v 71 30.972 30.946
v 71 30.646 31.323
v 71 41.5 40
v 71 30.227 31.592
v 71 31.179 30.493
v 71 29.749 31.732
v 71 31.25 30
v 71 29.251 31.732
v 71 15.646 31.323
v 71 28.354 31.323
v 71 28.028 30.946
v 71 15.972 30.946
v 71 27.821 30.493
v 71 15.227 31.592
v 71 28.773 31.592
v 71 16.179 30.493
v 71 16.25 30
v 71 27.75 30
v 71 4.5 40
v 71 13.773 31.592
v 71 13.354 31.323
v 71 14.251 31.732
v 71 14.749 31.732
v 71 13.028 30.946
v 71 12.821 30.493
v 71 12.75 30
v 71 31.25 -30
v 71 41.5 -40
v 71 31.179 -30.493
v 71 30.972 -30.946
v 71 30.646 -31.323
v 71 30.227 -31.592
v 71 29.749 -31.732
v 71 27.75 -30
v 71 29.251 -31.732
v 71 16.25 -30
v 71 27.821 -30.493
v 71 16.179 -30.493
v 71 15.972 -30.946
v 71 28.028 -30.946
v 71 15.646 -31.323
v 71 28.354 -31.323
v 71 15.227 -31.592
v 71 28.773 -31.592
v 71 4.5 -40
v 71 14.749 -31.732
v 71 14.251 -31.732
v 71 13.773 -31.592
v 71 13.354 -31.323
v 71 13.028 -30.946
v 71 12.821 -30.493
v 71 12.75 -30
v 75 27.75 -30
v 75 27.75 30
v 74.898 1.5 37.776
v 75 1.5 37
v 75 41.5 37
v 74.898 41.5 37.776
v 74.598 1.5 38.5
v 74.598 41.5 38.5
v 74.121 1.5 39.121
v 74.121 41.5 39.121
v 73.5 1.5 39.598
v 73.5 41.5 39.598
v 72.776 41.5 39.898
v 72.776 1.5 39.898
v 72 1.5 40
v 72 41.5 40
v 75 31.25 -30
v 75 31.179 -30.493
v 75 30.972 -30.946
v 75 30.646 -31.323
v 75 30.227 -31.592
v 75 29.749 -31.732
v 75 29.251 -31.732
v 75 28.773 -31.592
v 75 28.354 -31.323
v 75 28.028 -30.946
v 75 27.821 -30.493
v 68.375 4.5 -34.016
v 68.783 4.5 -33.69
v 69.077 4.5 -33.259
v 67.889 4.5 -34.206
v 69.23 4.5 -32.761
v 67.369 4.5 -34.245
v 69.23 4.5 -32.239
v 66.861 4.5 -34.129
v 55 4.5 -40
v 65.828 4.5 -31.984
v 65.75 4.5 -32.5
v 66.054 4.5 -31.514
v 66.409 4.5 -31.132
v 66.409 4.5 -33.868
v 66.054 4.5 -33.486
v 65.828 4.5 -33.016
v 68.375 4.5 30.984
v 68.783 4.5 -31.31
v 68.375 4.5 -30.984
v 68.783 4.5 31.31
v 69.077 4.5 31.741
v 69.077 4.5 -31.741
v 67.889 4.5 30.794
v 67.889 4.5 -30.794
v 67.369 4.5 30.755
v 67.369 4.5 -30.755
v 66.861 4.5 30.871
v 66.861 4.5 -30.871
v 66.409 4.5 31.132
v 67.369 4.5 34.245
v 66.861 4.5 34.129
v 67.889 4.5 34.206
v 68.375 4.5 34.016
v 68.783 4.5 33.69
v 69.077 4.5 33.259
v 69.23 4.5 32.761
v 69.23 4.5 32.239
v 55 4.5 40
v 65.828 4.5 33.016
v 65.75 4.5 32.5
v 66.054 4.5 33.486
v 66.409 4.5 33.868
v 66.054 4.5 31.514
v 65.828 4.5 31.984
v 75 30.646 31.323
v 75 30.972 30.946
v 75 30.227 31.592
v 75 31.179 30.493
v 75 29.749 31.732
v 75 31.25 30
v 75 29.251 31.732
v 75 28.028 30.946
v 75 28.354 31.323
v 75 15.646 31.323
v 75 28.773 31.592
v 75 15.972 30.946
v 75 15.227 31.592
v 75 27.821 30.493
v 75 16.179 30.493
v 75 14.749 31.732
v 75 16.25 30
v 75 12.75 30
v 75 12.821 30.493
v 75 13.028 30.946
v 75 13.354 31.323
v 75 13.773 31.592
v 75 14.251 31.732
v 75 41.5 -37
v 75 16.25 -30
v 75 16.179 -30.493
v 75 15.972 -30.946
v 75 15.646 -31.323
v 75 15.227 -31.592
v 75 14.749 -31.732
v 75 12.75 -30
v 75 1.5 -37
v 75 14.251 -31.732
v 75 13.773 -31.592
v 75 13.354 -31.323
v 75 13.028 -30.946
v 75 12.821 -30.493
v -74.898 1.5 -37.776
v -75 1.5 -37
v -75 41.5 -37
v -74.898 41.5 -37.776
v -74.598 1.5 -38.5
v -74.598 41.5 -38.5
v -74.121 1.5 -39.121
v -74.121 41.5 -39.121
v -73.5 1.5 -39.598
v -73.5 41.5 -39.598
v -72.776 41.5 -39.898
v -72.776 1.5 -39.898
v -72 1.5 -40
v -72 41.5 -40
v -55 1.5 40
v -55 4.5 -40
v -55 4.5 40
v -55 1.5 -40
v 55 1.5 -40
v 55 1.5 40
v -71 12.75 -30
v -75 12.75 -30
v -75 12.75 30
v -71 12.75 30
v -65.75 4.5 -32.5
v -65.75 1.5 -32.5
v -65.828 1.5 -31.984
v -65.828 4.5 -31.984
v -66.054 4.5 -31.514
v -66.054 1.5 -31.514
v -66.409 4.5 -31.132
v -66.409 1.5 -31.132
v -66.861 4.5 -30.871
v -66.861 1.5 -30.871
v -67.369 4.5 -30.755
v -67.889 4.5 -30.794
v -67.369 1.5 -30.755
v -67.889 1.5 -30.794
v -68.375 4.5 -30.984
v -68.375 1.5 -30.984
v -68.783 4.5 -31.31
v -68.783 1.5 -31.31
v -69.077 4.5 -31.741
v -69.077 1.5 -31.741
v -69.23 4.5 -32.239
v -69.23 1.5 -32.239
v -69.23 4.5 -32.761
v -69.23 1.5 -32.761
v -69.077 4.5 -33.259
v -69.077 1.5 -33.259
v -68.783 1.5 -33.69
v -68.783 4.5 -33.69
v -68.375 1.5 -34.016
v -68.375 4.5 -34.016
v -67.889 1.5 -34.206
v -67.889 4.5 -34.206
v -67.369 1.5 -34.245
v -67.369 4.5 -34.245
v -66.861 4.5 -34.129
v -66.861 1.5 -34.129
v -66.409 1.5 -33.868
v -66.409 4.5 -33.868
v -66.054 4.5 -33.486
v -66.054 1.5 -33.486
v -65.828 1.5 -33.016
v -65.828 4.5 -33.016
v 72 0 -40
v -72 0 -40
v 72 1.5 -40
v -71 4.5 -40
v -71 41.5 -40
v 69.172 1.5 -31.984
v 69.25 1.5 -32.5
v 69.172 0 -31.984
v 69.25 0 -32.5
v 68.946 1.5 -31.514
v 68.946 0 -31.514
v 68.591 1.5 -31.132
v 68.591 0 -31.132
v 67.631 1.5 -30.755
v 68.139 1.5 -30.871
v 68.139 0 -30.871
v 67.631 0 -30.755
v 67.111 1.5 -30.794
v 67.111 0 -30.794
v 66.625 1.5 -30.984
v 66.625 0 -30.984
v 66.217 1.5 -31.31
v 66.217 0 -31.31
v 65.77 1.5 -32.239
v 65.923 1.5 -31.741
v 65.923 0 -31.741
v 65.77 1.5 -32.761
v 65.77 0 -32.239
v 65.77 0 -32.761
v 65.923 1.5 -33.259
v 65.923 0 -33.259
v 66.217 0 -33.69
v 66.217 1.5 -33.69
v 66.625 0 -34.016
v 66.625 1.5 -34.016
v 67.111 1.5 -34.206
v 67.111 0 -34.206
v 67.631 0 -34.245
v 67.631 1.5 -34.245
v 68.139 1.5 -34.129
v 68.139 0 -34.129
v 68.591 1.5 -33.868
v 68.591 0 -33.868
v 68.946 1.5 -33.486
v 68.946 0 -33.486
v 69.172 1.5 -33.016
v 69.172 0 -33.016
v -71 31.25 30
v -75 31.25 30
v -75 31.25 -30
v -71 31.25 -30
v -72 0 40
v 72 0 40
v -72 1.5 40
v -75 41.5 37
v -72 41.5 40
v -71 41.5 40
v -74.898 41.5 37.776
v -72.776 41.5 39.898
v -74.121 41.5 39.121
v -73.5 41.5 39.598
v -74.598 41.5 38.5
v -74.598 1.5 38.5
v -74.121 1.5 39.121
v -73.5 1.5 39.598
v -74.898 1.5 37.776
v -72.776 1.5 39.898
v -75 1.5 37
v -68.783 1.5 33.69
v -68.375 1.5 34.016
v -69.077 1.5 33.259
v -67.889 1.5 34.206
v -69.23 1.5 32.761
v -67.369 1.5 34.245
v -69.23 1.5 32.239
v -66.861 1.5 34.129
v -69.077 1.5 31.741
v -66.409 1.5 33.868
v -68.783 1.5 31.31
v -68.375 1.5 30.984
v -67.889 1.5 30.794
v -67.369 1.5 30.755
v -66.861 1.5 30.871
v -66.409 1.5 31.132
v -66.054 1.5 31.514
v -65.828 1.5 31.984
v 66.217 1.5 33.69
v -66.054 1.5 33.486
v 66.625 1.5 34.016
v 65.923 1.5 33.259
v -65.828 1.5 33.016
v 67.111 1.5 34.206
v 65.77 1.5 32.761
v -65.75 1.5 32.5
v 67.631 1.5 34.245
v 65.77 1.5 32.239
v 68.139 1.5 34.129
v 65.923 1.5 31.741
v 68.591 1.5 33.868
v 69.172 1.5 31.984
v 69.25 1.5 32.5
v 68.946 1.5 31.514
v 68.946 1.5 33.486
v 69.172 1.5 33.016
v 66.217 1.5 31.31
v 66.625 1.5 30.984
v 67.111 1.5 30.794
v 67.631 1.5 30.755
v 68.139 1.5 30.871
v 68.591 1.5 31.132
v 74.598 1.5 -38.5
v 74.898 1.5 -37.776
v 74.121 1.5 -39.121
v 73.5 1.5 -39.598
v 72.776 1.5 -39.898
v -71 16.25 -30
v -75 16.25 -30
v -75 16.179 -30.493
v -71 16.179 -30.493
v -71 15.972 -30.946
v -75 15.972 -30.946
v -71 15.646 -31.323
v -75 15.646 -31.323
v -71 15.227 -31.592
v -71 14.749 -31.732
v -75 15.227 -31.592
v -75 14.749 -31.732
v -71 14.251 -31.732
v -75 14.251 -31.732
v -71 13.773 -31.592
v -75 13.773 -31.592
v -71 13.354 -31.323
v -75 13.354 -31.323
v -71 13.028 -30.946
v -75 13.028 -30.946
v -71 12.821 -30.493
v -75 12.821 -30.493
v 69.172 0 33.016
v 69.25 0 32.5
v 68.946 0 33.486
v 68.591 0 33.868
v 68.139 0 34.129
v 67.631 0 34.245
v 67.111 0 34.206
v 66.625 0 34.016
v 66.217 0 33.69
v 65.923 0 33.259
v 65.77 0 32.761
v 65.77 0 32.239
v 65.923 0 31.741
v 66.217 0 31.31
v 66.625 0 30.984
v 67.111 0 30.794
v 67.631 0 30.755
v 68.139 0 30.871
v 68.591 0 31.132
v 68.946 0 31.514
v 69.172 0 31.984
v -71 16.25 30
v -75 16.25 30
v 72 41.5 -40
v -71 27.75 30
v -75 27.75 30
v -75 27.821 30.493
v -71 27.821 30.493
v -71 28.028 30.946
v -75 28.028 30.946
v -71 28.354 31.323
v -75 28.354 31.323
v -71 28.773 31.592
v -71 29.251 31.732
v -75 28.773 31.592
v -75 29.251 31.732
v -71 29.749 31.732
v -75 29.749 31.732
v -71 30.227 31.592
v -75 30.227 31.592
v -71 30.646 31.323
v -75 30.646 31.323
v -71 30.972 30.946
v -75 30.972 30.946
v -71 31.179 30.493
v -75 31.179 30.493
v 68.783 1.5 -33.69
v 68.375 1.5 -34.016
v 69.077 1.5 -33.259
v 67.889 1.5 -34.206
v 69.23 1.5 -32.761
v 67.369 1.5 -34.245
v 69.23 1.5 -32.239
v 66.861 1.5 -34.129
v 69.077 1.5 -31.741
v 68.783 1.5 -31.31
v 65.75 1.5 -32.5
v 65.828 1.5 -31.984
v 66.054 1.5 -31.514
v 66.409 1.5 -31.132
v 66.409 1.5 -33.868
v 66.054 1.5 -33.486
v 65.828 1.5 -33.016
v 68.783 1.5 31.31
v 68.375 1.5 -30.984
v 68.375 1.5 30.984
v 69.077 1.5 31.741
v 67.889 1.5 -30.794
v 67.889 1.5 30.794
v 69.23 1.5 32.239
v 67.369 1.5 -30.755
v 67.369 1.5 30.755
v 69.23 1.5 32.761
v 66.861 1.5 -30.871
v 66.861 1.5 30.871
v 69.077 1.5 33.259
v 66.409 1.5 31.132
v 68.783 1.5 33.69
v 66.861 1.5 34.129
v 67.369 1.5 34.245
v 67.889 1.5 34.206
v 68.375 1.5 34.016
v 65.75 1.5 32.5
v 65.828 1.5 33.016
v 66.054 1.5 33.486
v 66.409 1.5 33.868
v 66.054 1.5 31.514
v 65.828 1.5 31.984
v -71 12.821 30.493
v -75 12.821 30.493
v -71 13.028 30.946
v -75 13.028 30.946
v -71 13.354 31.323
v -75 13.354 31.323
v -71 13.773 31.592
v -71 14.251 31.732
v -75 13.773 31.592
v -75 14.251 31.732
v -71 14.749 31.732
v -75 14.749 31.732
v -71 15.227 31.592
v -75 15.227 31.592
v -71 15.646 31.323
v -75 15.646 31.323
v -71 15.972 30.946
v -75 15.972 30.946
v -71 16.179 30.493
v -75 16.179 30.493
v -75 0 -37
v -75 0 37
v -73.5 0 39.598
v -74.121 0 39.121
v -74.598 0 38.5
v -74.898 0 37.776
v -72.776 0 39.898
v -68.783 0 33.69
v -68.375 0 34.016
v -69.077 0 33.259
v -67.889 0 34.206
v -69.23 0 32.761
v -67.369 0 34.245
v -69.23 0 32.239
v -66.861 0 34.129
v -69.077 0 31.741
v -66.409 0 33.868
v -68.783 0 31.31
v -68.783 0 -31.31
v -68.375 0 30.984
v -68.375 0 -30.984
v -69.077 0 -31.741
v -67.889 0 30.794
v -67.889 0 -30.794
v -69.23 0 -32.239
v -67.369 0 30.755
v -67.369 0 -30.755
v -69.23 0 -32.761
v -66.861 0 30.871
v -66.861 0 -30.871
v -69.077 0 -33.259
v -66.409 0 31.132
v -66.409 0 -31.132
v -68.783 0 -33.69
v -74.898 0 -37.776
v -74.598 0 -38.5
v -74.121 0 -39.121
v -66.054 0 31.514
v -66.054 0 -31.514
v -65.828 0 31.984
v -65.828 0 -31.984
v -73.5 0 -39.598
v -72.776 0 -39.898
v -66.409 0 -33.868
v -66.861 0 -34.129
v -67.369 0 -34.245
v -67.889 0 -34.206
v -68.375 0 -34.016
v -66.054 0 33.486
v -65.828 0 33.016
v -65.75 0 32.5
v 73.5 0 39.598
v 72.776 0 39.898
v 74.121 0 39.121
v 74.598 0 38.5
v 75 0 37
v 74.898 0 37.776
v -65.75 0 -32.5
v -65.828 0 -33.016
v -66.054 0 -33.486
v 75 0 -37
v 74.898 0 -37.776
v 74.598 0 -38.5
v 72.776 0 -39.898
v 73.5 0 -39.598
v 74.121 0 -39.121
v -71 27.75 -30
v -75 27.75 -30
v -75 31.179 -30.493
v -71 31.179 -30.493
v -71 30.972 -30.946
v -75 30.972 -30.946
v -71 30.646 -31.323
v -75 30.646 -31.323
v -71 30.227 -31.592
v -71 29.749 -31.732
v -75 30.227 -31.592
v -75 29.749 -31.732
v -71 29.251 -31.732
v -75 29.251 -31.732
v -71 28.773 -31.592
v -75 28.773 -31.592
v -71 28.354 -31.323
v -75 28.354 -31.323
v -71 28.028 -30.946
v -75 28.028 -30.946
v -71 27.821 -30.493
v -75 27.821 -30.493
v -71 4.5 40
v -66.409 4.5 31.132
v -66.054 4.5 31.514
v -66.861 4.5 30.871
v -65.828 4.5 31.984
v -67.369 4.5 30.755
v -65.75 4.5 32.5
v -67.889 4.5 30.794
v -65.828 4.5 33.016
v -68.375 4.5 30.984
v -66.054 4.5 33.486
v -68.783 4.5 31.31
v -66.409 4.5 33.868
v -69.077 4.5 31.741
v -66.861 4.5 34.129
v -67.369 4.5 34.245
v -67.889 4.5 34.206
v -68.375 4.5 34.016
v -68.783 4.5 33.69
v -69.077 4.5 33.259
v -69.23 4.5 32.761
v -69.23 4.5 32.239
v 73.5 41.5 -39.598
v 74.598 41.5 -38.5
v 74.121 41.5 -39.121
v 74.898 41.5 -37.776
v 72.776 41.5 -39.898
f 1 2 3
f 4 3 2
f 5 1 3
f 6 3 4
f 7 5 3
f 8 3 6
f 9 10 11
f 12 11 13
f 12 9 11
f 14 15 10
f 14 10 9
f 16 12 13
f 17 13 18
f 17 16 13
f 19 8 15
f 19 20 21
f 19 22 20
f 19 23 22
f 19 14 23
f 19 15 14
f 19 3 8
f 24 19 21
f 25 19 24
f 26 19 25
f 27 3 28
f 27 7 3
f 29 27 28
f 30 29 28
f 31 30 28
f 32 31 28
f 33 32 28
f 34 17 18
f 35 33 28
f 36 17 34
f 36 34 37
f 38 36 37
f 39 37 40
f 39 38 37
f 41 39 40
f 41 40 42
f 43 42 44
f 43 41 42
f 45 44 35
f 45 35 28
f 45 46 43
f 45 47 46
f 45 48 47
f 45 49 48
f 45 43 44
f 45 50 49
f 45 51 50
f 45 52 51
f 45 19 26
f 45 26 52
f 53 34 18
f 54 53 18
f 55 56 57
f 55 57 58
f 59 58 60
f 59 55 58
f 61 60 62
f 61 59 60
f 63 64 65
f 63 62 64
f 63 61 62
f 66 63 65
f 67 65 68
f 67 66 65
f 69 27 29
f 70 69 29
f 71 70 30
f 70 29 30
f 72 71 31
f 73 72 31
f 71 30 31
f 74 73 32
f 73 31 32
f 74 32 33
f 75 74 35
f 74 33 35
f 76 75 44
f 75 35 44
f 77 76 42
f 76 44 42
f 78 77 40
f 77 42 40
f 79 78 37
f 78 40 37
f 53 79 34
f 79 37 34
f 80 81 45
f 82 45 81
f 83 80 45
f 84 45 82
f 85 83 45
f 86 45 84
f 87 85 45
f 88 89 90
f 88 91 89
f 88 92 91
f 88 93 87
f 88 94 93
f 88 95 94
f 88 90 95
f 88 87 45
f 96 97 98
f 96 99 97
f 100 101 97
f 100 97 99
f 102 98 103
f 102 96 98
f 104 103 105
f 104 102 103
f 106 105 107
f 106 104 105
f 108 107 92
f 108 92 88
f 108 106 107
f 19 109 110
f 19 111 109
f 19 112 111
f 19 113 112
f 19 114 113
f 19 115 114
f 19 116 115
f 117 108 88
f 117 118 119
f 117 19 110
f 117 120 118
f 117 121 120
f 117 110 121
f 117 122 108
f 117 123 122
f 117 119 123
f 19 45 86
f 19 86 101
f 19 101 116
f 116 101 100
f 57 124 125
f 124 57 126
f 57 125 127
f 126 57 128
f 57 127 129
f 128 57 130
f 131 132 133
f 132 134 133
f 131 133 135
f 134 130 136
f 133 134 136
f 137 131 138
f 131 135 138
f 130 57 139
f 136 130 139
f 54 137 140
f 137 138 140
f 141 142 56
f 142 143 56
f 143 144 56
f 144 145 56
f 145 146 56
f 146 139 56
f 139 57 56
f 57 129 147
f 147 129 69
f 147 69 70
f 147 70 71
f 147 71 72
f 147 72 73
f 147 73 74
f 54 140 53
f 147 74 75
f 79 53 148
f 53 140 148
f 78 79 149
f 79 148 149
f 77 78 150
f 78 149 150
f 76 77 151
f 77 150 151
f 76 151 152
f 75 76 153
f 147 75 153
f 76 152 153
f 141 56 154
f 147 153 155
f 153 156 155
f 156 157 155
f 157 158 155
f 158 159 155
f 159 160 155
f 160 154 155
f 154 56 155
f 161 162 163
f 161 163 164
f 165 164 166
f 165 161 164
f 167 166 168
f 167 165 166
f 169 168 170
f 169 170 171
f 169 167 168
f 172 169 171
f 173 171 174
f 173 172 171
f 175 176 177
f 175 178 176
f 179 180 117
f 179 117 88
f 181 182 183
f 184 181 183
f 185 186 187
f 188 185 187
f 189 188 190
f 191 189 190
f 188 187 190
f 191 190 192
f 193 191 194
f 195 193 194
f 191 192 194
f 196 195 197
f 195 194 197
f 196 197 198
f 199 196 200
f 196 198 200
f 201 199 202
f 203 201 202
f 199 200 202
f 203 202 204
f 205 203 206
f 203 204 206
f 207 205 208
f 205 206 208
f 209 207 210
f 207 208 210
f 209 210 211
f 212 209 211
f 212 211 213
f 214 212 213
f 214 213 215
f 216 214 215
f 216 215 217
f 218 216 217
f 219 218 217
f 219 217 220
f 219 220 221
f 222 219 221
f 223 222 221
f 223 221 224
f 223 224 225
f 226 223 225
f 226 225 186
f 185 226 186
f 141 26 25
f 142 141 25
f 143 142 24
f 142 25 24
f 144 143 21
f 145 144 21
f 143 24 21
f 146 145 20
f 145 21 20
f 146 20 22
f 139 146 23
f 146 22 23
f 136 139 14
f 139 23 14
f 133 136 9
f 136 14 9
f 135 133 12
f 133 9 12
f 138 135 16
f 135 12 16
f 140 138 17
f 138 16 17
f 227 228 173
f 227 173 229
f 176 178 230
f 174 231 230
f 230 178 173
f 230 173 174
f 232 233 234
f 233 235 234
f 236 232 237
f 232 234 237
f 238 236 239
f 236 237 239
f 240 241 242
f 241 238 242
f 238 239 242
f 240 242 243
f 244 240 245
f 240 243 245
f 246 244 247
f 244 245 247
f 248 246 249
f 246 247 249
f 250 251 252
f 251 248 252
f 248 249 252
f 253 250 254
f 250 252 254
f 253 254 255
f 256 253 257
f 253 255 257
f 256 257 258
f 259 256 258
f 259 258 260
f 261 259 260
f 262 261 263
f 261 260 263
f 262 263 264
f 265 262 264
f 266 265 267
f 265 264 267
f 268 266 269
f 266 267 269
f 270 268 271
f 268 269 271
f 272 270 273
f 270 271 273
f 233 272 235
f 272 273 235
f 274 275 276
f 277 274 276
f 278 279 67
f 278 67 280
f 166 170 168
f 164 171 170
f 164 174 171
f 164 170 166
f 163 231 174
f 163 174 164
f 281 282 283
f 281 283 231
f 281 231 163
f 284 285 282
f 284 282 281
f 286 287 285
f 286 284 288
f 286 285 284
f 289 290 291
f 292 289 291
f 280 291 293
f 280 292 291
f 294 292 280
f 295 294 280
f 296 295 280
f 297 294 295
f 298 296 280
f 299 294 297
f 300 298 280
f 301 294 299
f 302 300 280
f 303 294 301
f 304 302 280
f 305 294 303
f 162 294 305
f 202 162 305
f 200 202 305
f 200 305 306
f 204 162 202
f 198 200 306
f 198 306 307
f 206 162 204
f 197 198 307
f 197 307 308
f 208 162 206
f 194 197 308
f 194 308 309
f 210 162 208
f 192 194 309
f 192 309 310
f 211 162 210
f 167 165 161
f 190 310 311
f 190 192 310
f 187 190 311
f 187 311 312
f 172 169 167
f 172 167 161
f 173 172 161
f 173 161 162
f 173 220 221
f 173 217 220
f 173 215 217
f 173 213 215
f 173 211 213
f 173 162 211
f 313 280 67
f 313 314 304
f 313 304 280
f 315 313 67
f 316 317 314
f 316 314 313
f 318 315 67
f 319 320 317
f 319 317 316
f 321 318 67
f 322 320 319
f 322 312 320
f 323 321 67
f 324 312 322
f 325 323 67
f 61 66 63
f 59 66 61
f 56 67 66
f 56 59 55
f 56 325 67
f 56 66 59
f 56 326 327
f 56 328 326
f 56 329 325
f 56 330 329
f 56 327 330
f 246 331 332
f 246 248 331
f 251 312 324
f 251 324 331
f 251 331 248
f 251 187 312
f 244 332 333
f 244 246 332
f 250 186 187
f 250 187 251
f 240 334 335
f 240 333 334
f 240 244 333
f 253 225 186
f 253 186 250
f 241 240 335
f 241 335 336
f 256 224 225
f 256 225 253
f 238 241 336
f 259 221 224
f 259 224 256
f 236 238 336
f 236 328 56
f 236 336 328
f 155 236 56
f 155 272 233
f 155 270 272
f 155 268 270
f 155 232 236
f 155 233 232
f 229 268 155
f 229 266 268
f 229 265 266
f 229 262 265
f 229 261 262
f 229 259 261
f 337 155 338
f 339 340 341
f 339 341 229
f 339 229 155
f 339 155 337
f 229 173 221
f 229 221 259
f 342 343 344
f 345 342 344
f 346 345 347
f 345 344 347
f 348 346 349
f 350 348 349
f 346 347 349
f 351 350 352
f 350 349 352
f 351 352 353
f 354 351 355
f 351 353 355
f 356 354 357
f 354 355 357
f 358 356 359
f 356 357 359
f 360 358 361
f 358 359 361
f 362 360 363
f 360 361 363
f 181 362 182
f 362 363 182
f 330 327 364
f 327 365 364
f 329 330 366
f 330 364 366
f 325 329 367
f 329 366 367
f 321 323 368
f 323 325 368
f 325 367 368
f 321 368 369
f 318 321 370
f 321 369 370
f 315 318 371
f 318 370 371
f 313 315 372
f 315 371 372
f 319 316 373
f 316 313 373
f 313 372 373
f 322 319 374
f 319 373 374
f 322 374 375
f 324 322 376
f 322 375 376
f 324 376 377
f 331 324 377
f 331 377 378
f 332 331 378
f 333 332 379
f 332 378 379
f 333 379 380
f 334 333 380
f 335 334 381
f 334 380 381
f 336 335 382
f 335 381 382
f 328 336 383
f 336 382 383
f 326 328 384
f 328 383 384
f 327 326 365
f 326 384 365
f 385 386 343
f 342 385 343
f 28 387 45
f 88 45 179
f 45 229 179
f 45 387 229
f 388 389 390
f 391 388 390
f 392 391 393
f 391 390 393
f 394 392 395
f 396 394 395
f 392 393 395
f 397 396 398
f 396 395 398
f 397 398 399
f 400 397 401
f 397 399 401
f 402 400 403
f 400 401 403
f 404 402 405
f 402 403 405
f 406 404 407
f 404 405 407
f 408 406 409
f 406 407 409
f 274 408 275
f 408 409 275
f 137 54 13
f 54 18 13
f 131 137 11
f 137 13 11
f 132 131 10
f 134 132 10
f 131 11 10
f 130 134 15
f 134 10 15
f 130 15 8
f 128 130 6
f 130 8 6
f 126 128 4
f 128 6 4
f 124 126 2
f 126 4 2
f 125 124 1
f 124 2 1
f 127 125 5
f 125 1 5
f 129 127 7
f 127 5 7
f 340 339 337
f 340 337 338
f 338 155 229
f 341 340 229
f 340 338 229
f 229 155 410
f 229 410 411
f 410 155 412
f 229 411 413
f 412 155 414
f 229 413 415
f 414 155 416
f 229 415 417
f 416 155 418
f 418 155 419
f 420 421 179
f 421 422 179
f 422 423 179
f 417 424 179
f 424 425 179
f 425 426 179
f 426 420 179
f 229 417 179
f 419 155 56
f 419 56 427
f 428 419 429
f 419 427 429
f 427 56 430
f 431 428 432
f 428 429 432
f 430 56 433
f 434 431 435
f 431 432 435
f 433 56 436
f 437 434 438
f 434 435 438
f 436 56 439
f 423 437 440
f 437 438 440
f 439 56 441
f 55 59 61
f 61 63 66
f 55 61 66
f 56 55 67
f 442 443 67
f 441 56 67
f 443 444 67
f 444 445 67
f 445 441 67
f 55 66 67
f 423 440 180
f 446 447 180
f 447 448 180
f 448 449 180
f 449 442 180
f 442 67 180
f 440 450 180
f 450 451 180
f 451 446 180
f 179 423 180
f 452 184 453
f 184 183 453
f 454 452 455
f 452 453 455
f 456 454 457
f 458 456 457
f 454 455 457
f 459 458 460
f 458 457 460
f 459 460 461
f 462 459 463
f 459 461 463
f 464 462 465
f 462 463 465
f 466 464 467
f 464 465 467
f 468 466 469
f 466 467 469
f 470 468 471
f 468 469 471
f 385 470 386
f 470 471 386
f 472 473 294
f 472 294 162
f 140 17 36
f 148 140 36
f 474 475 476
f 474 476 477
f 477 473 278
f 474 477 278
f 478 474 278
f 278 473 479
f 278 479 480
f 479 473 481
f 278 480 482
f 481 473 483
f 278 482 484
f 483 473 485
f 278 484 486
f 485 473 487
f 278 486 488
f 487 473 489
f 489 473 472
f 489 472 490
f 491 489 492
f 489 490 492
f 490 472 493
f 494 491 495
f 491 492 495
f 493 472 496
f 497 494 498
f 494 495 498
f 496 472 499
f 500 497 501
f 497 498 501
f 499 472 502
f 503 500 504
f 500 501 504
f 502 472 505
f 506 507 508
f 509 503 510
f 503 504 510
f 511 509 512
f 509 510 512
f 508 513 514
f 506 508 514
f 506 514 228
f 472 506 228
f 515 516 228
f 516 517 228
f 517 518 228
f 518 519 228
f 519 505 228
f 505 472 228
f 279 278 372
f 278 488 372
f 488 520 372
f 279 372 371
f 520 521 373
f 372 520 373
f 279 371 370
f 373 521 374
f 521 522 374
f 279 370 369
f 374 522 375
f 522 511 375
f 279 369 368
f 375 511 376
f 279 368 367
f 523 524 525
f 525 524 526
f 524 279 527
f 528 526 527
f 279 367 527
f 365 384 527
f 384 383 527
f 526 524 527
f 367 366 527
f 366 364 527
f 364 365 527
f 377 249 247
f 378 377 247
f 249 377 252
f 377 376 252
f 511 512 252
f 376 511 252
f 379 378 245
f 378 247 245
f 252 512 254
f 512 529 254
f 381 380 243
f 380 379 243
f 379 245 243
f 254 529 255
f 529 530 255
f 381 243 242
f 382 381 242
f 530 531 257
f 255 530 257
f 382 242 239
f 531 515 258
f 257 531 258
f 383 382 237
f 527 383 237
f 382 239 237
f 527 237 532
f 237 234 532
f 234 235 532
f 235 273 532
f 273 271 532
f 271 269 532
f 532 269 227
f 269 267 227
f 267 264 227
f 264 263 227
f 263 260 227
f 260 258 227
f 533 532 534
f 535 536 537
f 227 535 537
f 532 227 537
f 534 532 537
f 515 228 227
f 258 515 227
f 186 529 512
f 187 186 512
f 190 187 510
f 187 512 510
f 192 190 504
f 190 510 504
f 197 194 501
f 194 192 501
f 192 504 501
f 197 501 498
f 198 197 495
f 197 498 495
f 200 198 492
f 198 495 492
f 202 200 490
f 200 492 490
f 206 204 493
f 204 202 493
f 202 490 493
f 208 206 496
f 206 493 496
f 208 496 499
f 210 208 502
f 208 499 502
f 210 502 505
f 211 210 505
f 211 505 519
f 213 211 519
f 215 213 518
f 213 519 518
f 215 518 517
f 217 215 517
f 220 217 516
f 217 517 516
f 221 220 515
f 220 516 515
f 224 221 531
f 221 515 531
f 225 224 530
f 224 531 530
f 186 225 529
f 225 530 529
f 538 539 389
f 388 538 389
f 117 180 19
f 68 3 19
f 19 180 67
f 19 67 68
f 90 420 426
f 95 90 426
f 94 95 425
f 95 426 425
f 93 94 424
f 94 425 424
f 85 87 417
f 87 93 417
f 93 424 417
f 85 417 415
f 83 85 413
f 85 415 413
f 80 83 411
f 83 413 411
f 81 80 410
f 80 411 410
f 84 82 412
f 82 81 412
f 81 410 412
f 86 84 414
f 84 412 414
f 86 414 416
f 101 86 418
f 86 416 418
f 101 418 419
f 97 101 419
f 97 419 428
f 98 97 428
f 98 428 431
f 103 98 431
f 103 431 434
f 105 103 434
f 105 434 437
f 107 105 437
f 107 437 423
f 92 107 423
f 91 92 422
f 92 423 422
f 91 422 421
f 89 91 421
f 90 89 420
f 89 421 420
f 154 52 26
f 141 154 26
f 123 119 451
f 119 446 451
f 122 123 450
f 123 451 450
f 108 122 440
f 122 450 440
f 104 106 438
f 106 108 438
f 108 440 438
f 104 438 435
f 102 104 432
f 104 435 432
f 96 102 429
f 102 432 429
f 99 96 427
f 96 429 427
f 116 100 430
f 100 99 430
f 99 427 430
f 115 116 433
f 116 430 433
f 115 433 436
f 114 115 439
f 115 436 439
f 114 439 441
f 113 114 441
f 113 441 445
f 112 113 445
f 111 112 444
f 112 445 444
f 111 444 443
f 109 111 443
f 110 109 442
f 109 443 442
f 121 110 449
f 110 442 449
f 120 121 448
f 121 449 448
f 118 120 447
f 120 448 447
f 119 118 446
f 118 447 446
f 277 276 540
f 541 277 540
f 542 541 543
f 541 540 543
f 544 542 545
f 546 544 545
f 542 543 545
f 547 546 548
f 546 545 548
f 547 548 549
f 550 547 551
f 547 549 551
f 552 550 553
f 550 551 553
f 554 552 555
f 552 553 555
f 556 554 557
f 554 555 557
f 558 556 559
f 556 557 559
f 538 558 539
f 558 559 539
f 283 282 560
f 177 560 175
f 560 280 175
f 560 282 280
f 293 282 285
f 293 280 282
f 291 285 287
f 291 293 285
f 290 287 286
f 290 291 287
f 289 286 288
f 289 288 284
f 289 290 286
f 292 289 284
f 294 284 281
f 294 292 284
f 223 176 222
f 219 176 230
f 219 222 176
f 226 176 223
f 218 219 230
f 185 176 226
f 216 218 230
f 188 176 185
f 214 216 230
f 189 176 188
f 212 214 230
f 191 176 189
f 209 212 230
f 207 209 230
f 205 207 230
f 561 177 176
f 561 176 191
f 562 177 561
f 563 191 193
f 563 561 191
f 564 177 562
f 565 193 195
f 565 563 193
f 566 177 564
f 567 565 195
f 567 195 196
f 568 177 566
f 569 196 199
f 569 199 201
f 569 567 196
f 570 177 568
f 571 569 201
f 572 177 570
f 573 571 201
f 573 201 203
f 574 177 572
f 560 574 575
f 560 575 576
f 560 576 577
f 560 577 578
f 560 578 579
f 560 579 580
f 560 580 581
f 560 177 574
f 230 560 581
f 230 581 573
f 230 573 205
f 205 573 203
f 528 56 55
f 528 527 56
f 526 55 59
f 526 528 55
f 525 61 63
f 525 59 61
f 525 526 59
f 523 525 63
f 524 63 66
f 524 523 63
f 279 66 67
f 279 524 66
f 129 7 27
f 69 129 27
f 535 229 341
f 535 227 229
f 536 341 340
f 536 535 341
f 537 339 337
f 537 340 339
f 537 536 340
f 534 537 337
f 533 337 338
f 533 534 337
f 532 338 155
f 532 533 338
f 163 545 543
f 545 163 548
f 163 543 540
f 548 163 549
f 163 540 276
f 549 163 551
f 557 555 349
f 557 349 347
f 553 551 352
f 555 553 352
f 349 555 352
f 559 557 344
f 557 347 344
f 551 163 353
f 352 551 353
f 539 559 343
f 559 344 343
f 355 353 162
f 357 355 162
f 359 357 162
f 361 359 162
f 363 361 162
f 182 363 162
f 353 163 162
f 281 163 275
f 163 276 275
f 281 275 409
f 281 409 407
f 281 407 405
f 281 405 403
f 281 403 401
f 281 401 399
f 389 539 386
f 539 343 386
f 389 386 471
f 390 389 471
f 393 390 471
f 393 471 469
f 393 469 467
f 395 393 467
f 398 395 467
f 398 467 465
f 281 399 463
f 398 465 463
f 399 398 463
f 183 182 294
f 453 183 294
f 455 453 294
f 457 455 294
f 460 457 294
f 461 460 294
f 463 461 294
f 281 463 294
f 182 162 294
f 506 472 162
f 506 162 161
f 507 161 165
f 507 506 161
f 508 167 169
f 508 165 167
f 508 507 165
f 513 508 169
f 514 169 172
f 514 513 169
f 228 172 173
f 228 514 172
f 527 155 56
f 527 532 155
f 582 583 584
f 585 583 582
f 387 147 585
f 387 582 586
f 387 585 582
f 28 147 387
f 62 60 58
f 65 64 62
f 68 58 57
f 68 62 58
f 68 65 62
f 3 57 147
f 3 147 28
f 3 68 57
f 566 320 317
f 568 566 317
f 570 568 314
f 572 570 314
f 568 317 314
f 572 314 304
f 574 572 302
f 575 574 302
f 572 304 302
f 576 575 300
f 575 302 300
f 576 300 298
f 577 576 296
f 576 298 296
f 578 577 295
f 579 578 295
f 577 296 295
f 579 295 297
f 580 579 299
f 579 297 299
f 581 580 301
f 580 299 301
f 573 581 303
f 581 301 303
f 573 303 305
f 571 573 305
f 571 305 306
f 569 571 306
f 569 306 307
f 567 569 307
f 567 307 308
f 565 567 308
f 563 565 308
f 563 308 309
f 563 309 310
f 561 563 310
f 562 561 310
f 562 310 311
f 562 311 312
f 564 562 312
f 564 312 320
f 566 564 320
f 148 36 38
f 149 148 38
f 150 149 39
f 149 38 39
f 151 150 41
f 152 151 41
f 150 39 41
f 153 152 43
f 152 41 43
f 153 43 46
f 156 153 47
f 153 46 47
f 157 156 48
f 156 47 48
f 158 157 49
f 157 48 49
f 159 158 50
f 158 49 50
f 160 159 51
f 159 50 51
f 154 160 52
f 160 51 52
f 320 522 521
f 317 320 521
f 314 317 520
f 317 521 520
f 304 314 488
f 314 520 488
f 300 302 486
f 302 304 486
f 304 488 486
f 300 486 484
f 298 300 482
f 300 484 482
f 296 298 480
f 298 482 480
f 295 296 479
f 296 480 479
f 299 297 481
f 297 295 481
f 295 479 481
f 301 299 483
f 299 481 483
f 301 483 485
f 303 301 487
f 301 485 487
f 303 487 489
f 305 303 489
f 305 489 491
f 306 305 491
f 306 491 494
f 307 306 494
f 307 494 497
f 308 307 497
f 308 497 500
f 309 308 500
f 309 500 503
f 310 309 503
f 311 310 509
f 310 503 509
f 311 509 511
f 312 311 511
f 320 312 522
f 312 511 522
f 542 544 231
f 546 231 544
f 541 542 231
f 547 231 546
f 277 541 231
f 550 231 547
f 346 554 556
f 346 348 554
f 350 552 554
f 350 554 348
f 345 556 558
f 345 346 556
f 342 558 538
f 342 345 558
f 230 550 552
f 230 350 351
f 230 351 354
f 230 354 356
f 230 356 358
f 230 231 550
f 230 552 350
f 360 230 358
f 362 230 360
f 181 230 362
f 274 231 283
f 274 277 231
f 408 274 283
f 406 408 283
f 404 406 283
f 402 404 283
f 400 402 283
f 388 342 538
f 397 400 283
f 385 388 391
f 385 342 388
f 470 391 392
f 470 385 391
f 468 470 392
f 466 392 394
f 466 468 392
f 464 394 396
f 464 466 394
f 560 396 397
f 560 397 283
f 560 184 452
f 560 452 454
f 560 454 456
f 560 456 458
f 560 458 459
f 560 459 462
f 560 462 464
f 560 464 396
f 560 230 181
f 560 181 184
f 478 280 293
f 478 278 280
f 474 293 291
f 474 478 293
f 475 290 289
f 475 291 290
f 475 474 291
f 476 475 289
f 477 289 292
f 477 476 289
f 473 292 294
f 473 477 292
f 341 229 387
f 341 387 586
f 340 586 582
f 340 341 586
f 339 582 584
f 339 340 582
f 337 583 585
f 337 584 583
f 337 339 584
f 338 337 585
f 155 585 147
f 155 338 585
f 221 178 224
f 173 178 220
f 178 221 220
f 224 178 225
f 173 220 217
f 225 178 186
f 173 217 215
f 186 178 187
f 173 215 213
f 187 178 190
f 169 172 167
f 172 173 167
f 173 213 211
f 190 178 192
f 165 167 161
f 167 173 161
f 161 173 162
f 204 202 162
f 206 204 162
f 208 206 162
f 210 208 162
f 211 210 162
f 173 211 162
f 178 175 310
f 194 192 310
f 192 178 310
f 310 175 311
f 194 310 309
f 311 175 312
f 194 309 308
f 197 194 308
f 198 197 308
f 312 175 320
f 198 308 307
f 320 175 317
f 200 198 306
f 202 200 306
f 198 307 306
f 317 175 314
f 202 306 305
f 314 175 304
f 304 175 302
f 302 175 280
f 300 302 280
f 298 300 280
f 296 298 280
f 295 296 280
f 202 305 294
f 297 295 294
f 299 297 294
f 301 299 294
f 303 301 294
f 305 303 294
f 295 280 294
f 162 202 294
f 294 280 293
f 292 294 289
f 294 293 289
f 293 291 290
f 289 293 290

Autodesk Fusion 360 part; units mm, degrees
sketch "Sketch1" plane through (0, 0, 0) normal (0, 1, 0) x (1, 0, 0) in component "PCB Profile"
  line L0 (72, -40) -> (-72, -40)
  line L1 (-75, -37) -> (-75, 37)
  line L2 (-72, 40) -> (72, 40)
  line L3 (75, 37) -> (75, -37)
  line L4 (75, -40) -> (-75, 40) construction
  line L5 (-75, -40) -> (75, 40) construction
  arc A0 (-75, -37) -> (-72, -40) centre (-72, -37) ccw
  arc A1 (72, -40) -> (75, -37) centre (72, -37) ccw
  arc A2 (75, 37) -> (72, 40) centre (72, 37) ccw
  arc A3 (-72, 40) -> (-75, 37) centre (-72, 37) ccw
  circle A4 centre (67.5, -32.5) radius 1.75
  line L6 (0, 0) -> (0, -40) construction
  line L7 (0, 0) -> (-75, 0) construction
  circle A5 centre (-67.5, -32.5) radius 1.75
  circle A6 centre (-67.5, 32.5) radius 1.75
  circle A7 centre (67.5, 32.5) radius 1.75
  point P0 (-67.5, -32.5)
  dimension "d1" = 3
  dimension "d2" = 150
  dimension "d3" = 80
  dimension "d8" = 3.5
  dimension "d9" = 67.5
  dimension "d10" = 32.5
  dimension "d16" = 7.5
  dimension "d17" = 7.5
extrude "Extrude1" add sketch "Sketch1" along normal blind 1.5 makes body 1 in component "PCB Profile"
sketch "Sketch1 (2)" plane through (0, 1.5, 0) normal (0, 1, 0) x (-1, 0, 0) in component "Rack Mounts"
  arc A0 (-75, -37) -> (-72, -40) centre (-72, -37) ccw
  line L0 (-72, -40) -> (72, -40)
  arc A1 (72, -40) -> (75, -37) centre (72, -37) ccw
  line L1 (75, -37) -> (75, 37)
  arc A2 (75, 37) -> (72, 40) centre (72, 37) ccw
  line L2 (72, 40) -> (-72, 40)
  arc A3 (-72, 40) -> (-75, 37) centre (-72, 37) ccw
  line L3 (-75, 37) -> (-75, -37)
  line L4 (-55, 40) -> (-55, -40)
  line L5 (55, 40) -> (55, -40)
  circle A4 centre (-67.5, 32.5) radius 1.75
  circle A5 centre (-67.5, -32.5) radius 1.75
  circle A6 centre (67.5, -32.5) radius 1.75
  circle A7 centre (67.5, 32.5) radius 1.75
  line L6 (-71, 40) -> (-71, -40)
  dimension "d6" = 20
  dimension "d7" = 20
  dimension "d11" = 4
extrude "Extrude1'" add sketch "Sketch1 (2)" along normal blind 40 separate body contours A0 L0 L2 A3 L3 L6 makes body 2 in component "Rack Mounts"
extrude "Extrude2" add sketch "Sketch1 (2)" along normal blind 3 contours L0 L2 L4 L6 bodies 2 in component "Rack Mounts"
mirror "Mirror1" about plane through (0, 0, 0) normal (1, 0, 0) of bodies 2 makes body 3 in component "Rack Mounts"
sketch "Sketch2" plane through (-75, 0, 0) normal (-1, 0, 0) x (0, -1, 0) in component "Rack Mounts"
  line L0 (-1.5, -37) -> (-1.5, 37)
  line L1 (-1.5, 37) -> (-41.5, 37)
  line L2 (-41.5, 37) -> (-41.5, -37)
  line L3 (-41.5, -37) -> (-1.5, -37)
  line L4 (-31.25, 30) -> (-31.25, -30)
  arc A0 (-31.25, -30) -> (-27.75, -30) centre (-29.5, -30) ccw
  line L5 (-27.75, -30) -> (-27.75, 30)
  arc A1 (-27.75, 30) -> (-31.25, 30) centre (-29.5, 30) ccw
  line L6 (-29.5, 30) -> (-29.5, -30) construction
  line L7 (-16.25, 30) -> (-16.25, -30)
  arc A2 (-16.25, -30) -> (-12.75, -30) centre (-14.5, -30) ccw
  line L8 (-12.75, -30) -> (-12.75, 30)
  arc A3 (-12.75, 30) -> (-16.25, 30) centre (-14.5, 30) ccw
  line L9 (-14.5, 30) -> (-14.5, -30) construction
  line L10 (-1.5, -40) -> (-41.5, -40)
  line L11 (-1.5, 40) -> (-41.5, 40)
  point P0 (-4.5, 40)
  dimension "d20" = 1.75
  dimension "d21" = 15
  dimension "d22" = 10
  dimension "d23" = 10
  dimension "d24" = 10
extrude "Extrude3" cut sketch "Sketch2" against normal through all contours L4 A0 L5 A1 | L7 A2 L8 A3 bodies 2 3 in component "Rack Mounts"
component "PCB Profile" placed x (1, 0, 0) y (0, 1, 0) z (0, 0, 1) at (0, 0, 0)
component "Rack Mounts" placed x (1, 0, 0) y (0, 1, 0) z (0, 0, 1) at (0, 0, 0)
equation "d7 = d6"
equation "d20 = ( 3.5 / 2 ) * 1 mm"
